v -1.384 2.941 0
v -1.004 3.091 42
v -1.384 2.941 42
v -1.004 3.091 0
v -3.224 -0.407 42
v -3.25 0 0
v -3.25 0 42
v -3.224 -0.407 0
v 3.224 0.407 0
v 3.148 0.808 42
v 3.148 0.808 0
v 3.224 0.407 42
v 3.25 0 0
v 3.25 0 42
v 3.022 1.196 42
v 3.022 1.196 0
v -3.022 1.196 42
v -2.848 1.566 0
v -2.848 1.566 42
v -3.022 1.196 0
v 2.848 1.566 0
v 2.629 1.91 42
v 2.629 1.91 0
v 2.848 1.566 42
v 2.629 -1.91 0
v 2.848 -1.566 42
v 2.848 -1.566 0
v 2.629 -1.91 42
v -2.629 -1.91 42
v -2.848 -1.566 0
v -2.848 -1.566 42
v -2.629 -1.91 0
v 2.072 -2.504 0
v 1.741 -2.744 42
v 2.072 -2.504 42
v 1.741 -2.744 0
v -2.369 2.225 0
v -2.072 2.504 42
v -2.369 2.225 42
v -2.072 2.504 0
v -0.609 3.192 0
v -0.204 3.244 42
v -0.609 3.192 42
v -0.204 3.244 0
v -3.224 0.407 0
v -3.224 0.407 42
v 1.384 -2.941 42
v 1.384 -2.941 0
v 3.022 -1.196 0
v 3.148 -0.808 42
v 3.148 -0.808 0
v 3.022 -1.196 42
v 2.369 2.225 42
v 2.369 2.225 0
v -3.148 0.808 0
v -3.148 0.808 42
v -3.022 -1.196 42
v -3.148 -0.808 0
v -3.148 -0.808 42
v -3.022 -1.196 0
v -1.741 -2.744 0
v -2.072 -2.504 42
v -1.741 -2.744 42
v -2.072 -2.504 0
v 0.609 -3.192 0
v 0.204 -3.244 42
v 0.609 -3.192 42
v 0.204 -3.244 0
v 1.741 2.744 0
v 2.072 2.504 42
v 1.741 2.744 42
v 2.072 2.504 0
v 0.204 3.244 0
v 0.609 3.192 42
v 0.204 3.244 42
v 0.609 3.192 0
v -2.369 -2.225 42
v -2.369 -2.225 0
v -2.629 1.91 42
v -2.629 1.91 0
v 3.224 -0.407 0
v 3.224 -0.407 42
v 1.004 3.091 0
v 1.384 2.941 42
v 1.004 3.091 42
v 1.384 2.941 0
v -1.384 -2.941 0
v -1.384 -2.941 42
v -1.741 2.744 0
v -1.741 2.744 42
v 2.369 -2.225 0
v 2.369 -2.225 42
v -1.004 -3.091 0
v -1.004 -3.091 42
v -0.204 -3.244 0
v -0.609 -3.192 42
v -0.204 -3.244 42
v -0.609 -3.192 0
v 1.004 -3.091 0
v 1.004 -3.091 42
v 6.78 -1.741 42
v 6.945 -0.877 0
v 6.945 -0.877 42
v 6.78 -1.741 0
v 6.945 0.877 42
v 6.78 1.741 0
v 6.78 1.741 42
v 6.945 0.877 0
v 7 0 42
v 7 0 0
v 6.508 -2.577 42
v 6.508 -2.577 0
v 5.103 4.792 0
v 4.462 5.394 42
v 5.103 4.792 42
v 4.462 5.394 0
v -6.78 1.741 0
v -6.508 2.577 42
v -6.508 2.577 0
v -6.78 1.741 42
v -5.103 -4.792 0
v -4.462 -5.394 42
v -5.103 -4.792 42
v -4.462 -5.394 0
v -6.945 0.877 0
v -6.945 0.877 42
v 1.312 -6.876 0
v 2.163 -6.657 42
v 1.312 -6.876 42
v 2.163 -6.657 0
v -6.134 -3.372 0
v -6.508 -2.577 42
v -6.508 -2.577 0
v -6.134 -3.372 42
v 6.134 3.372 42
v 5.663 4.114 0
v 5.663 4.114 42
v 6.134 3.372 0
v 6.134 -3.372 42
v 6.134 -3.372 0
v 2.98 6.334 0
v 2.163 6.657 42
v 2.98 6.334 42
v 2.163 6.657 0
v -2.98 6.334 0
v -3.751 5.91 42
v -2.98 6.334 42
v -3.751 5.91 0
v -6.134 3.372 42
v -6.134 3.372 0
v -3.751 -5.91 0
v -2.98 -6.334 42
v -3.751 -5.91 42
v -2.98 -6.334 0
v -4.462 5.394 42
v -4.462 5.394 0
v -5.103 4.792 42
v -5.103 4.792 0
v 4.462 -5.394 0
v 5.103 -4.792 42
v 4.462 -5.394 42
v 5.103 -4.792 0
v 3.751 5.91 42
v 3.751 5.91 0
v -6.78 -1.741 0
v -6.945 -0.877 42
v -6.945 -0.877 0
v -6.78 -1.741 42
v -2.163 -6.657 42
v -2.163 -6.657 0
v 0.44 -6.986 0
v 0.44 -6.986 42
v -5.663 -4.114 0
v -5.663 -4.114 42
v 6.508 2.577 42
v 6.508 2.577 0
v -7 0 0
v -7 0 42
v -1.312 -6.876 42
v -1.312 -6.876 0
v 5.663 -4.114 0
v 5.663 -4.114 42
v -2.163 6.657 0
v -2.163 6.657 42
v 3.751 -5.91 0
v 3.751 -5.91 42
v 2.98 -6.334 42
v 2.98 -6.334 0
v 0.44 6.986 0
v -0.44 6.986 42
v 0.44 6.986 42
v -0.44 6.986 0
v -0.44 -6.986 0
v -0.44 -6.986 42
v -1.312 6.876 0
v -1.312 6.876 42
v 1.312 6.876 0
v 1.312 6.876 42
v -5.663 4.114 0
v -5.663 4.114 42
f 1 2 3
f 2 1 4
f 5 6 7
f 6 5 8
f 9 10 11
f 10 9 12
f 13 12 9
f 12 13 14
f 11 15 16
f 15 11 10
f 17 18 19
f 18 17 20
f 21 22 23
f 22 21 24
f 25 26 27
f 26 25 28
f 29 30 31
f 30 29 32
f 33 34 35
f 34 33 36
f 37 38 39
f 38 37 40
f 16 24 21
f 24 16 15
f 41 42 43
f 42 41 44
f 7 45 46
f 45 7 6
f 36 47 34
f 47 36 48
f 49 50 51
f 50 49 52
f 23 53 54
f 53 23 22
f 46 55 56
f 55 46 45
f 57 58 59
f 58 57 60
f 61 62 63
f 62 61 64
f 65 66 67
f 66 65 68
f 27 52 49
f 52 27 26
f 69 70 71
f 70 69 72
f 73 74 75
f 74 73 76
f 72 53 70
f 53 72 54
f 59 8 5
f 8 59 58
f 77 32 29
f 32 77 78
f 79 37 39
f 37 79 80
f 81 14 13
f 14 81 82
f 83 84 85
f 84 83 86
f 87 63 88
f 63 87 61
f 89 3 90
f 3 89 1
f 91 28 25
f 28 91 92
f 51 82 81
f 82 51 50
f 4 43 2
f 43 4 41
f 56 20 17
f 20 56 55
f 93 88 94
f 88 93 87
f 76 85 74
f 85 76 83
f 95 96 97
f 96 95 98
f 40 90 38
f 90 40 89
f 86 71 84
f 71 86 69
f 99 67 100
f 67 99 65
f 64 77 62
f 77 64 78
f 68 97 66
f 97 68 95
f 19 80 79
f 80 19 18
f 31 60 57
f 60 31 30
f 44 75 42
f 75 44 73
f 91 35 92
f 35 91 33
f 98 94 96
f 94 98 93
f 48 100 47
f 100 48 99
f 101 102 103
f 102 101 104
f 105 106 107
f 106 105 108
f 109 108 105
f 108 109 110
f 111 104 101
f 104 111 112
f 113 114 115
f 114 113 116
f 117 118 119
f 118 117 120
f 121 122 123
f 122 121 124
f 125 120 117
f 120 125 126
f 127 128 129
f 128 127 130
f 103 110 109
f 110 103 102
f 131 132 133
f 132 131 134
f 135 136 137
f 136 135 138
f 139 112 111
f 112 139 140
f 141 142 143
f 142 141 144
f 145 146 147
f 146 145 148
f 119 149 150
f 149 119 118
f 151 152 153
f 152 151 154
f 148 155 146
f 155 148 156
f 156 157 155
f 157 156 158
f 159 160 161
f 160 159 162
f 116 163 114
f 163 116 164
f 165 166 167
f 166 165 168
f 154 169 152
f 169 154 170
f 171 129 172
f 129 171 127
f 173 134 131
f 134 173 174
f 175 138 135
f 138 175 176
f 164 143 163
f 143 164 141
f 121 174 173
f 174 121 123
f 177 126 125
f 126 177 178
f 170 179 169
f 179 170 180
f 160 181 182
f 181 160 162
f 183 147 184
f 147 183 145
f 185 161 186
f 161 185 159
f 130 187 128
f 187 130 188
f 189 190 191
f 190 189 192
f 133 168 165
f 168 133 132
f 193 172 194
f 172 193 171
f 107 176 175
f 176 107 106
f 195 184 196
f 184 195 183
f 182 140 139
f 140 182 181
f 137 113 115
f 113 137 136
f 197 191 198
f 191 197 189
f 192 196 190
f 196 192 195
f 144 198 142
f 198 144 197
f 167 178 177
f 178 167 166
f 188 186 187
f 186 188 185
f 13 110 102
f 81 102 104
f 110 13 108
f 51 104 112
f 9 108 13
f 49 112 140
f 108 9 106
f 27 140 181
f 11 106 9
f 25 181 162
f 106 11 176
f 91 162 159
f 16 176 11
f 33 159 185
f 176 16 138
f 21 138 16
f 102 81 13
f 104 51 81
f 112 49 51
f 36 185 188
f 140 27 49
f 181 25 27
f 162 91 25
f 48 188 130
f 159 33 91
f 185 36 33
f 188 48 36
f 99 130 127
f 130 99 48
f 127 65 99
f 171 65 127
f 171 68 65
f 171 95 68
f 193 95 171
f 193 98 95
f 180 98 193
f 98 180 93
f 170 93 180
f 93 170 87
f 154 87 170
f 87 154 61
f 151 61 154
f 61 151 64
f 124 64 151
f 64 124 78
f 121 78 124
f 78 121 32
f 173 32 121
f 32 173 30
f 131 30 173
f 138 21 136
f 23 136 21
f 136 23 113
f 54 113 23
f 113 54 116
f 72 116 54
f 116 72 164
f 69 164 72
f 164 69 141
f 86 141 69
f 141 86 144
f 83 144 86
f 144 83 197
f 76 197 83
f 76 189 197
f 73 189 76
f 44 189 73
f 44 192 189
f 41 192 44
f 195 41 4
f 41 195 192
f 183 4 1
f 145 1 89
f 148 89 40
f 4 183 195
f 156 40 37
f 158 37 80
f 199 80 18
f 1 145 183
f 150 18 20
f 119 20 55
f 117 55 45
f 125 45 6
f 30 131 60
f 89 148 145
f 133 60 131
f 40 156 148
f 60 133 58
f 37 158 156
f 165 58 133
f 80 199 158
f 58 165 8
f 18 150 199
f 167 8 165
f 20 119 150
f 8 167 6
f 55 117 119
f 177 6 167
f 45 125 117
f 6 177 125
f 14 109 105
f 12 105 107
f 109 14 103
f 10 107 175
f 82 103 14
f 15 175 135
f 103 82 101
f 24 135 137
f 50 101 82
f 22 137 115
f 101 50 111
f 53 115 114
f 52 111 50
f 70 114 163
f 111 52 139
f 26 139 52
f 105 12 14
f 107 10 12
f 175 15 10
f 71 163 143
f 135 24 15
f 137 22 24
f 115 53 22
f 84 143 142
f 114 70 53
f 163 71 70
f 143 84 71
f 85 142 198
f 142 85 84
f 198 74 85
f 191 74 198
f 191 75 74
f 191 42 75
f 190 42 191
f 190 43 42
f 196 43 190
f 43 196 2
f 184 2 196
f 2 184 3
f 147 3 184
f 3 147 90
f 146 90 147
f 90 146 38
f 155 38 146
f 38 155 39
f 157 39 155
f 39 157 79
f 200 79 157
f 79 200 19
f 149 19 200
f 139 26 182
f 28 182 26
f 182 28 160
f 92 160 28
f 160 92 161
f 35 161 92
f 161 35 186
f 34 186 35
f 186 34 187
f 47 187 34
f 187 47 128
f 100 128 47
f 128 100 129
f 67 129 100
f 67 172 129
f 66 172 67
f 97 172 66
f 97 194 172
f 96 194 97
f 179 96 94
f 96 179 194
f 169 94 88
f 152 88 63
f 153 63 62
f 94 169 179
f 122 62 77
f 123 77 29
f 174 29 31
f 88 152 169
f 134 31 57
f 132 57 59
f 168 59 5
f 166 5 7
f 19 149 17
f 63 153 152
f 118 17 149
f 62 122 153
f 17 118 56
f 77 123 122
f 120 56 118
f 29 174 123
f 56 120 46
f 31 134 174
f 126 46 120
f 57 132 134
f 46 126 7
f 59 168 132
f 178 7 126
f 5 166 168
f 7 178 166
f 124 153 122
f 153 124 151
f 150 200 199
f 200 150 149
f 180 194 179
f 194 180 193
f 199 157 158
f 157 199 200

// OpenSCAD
$fn = 50;


difference() {
	union() {
		cylinder(h = 42, r = 7.0000000000);
	}
	union() {
		translate(v = [0.0000000000, 0.0000000000, -100.0000000000]) {
			cylinder(h = 200, r = 3.2500000000);
		}
		cylinder(h = 42, r = 1.8000000000);
		cylinder(h = 42, r = 1.8000000000);
		cylinder(h = 42, r = 1.8000000000);
	}
}
